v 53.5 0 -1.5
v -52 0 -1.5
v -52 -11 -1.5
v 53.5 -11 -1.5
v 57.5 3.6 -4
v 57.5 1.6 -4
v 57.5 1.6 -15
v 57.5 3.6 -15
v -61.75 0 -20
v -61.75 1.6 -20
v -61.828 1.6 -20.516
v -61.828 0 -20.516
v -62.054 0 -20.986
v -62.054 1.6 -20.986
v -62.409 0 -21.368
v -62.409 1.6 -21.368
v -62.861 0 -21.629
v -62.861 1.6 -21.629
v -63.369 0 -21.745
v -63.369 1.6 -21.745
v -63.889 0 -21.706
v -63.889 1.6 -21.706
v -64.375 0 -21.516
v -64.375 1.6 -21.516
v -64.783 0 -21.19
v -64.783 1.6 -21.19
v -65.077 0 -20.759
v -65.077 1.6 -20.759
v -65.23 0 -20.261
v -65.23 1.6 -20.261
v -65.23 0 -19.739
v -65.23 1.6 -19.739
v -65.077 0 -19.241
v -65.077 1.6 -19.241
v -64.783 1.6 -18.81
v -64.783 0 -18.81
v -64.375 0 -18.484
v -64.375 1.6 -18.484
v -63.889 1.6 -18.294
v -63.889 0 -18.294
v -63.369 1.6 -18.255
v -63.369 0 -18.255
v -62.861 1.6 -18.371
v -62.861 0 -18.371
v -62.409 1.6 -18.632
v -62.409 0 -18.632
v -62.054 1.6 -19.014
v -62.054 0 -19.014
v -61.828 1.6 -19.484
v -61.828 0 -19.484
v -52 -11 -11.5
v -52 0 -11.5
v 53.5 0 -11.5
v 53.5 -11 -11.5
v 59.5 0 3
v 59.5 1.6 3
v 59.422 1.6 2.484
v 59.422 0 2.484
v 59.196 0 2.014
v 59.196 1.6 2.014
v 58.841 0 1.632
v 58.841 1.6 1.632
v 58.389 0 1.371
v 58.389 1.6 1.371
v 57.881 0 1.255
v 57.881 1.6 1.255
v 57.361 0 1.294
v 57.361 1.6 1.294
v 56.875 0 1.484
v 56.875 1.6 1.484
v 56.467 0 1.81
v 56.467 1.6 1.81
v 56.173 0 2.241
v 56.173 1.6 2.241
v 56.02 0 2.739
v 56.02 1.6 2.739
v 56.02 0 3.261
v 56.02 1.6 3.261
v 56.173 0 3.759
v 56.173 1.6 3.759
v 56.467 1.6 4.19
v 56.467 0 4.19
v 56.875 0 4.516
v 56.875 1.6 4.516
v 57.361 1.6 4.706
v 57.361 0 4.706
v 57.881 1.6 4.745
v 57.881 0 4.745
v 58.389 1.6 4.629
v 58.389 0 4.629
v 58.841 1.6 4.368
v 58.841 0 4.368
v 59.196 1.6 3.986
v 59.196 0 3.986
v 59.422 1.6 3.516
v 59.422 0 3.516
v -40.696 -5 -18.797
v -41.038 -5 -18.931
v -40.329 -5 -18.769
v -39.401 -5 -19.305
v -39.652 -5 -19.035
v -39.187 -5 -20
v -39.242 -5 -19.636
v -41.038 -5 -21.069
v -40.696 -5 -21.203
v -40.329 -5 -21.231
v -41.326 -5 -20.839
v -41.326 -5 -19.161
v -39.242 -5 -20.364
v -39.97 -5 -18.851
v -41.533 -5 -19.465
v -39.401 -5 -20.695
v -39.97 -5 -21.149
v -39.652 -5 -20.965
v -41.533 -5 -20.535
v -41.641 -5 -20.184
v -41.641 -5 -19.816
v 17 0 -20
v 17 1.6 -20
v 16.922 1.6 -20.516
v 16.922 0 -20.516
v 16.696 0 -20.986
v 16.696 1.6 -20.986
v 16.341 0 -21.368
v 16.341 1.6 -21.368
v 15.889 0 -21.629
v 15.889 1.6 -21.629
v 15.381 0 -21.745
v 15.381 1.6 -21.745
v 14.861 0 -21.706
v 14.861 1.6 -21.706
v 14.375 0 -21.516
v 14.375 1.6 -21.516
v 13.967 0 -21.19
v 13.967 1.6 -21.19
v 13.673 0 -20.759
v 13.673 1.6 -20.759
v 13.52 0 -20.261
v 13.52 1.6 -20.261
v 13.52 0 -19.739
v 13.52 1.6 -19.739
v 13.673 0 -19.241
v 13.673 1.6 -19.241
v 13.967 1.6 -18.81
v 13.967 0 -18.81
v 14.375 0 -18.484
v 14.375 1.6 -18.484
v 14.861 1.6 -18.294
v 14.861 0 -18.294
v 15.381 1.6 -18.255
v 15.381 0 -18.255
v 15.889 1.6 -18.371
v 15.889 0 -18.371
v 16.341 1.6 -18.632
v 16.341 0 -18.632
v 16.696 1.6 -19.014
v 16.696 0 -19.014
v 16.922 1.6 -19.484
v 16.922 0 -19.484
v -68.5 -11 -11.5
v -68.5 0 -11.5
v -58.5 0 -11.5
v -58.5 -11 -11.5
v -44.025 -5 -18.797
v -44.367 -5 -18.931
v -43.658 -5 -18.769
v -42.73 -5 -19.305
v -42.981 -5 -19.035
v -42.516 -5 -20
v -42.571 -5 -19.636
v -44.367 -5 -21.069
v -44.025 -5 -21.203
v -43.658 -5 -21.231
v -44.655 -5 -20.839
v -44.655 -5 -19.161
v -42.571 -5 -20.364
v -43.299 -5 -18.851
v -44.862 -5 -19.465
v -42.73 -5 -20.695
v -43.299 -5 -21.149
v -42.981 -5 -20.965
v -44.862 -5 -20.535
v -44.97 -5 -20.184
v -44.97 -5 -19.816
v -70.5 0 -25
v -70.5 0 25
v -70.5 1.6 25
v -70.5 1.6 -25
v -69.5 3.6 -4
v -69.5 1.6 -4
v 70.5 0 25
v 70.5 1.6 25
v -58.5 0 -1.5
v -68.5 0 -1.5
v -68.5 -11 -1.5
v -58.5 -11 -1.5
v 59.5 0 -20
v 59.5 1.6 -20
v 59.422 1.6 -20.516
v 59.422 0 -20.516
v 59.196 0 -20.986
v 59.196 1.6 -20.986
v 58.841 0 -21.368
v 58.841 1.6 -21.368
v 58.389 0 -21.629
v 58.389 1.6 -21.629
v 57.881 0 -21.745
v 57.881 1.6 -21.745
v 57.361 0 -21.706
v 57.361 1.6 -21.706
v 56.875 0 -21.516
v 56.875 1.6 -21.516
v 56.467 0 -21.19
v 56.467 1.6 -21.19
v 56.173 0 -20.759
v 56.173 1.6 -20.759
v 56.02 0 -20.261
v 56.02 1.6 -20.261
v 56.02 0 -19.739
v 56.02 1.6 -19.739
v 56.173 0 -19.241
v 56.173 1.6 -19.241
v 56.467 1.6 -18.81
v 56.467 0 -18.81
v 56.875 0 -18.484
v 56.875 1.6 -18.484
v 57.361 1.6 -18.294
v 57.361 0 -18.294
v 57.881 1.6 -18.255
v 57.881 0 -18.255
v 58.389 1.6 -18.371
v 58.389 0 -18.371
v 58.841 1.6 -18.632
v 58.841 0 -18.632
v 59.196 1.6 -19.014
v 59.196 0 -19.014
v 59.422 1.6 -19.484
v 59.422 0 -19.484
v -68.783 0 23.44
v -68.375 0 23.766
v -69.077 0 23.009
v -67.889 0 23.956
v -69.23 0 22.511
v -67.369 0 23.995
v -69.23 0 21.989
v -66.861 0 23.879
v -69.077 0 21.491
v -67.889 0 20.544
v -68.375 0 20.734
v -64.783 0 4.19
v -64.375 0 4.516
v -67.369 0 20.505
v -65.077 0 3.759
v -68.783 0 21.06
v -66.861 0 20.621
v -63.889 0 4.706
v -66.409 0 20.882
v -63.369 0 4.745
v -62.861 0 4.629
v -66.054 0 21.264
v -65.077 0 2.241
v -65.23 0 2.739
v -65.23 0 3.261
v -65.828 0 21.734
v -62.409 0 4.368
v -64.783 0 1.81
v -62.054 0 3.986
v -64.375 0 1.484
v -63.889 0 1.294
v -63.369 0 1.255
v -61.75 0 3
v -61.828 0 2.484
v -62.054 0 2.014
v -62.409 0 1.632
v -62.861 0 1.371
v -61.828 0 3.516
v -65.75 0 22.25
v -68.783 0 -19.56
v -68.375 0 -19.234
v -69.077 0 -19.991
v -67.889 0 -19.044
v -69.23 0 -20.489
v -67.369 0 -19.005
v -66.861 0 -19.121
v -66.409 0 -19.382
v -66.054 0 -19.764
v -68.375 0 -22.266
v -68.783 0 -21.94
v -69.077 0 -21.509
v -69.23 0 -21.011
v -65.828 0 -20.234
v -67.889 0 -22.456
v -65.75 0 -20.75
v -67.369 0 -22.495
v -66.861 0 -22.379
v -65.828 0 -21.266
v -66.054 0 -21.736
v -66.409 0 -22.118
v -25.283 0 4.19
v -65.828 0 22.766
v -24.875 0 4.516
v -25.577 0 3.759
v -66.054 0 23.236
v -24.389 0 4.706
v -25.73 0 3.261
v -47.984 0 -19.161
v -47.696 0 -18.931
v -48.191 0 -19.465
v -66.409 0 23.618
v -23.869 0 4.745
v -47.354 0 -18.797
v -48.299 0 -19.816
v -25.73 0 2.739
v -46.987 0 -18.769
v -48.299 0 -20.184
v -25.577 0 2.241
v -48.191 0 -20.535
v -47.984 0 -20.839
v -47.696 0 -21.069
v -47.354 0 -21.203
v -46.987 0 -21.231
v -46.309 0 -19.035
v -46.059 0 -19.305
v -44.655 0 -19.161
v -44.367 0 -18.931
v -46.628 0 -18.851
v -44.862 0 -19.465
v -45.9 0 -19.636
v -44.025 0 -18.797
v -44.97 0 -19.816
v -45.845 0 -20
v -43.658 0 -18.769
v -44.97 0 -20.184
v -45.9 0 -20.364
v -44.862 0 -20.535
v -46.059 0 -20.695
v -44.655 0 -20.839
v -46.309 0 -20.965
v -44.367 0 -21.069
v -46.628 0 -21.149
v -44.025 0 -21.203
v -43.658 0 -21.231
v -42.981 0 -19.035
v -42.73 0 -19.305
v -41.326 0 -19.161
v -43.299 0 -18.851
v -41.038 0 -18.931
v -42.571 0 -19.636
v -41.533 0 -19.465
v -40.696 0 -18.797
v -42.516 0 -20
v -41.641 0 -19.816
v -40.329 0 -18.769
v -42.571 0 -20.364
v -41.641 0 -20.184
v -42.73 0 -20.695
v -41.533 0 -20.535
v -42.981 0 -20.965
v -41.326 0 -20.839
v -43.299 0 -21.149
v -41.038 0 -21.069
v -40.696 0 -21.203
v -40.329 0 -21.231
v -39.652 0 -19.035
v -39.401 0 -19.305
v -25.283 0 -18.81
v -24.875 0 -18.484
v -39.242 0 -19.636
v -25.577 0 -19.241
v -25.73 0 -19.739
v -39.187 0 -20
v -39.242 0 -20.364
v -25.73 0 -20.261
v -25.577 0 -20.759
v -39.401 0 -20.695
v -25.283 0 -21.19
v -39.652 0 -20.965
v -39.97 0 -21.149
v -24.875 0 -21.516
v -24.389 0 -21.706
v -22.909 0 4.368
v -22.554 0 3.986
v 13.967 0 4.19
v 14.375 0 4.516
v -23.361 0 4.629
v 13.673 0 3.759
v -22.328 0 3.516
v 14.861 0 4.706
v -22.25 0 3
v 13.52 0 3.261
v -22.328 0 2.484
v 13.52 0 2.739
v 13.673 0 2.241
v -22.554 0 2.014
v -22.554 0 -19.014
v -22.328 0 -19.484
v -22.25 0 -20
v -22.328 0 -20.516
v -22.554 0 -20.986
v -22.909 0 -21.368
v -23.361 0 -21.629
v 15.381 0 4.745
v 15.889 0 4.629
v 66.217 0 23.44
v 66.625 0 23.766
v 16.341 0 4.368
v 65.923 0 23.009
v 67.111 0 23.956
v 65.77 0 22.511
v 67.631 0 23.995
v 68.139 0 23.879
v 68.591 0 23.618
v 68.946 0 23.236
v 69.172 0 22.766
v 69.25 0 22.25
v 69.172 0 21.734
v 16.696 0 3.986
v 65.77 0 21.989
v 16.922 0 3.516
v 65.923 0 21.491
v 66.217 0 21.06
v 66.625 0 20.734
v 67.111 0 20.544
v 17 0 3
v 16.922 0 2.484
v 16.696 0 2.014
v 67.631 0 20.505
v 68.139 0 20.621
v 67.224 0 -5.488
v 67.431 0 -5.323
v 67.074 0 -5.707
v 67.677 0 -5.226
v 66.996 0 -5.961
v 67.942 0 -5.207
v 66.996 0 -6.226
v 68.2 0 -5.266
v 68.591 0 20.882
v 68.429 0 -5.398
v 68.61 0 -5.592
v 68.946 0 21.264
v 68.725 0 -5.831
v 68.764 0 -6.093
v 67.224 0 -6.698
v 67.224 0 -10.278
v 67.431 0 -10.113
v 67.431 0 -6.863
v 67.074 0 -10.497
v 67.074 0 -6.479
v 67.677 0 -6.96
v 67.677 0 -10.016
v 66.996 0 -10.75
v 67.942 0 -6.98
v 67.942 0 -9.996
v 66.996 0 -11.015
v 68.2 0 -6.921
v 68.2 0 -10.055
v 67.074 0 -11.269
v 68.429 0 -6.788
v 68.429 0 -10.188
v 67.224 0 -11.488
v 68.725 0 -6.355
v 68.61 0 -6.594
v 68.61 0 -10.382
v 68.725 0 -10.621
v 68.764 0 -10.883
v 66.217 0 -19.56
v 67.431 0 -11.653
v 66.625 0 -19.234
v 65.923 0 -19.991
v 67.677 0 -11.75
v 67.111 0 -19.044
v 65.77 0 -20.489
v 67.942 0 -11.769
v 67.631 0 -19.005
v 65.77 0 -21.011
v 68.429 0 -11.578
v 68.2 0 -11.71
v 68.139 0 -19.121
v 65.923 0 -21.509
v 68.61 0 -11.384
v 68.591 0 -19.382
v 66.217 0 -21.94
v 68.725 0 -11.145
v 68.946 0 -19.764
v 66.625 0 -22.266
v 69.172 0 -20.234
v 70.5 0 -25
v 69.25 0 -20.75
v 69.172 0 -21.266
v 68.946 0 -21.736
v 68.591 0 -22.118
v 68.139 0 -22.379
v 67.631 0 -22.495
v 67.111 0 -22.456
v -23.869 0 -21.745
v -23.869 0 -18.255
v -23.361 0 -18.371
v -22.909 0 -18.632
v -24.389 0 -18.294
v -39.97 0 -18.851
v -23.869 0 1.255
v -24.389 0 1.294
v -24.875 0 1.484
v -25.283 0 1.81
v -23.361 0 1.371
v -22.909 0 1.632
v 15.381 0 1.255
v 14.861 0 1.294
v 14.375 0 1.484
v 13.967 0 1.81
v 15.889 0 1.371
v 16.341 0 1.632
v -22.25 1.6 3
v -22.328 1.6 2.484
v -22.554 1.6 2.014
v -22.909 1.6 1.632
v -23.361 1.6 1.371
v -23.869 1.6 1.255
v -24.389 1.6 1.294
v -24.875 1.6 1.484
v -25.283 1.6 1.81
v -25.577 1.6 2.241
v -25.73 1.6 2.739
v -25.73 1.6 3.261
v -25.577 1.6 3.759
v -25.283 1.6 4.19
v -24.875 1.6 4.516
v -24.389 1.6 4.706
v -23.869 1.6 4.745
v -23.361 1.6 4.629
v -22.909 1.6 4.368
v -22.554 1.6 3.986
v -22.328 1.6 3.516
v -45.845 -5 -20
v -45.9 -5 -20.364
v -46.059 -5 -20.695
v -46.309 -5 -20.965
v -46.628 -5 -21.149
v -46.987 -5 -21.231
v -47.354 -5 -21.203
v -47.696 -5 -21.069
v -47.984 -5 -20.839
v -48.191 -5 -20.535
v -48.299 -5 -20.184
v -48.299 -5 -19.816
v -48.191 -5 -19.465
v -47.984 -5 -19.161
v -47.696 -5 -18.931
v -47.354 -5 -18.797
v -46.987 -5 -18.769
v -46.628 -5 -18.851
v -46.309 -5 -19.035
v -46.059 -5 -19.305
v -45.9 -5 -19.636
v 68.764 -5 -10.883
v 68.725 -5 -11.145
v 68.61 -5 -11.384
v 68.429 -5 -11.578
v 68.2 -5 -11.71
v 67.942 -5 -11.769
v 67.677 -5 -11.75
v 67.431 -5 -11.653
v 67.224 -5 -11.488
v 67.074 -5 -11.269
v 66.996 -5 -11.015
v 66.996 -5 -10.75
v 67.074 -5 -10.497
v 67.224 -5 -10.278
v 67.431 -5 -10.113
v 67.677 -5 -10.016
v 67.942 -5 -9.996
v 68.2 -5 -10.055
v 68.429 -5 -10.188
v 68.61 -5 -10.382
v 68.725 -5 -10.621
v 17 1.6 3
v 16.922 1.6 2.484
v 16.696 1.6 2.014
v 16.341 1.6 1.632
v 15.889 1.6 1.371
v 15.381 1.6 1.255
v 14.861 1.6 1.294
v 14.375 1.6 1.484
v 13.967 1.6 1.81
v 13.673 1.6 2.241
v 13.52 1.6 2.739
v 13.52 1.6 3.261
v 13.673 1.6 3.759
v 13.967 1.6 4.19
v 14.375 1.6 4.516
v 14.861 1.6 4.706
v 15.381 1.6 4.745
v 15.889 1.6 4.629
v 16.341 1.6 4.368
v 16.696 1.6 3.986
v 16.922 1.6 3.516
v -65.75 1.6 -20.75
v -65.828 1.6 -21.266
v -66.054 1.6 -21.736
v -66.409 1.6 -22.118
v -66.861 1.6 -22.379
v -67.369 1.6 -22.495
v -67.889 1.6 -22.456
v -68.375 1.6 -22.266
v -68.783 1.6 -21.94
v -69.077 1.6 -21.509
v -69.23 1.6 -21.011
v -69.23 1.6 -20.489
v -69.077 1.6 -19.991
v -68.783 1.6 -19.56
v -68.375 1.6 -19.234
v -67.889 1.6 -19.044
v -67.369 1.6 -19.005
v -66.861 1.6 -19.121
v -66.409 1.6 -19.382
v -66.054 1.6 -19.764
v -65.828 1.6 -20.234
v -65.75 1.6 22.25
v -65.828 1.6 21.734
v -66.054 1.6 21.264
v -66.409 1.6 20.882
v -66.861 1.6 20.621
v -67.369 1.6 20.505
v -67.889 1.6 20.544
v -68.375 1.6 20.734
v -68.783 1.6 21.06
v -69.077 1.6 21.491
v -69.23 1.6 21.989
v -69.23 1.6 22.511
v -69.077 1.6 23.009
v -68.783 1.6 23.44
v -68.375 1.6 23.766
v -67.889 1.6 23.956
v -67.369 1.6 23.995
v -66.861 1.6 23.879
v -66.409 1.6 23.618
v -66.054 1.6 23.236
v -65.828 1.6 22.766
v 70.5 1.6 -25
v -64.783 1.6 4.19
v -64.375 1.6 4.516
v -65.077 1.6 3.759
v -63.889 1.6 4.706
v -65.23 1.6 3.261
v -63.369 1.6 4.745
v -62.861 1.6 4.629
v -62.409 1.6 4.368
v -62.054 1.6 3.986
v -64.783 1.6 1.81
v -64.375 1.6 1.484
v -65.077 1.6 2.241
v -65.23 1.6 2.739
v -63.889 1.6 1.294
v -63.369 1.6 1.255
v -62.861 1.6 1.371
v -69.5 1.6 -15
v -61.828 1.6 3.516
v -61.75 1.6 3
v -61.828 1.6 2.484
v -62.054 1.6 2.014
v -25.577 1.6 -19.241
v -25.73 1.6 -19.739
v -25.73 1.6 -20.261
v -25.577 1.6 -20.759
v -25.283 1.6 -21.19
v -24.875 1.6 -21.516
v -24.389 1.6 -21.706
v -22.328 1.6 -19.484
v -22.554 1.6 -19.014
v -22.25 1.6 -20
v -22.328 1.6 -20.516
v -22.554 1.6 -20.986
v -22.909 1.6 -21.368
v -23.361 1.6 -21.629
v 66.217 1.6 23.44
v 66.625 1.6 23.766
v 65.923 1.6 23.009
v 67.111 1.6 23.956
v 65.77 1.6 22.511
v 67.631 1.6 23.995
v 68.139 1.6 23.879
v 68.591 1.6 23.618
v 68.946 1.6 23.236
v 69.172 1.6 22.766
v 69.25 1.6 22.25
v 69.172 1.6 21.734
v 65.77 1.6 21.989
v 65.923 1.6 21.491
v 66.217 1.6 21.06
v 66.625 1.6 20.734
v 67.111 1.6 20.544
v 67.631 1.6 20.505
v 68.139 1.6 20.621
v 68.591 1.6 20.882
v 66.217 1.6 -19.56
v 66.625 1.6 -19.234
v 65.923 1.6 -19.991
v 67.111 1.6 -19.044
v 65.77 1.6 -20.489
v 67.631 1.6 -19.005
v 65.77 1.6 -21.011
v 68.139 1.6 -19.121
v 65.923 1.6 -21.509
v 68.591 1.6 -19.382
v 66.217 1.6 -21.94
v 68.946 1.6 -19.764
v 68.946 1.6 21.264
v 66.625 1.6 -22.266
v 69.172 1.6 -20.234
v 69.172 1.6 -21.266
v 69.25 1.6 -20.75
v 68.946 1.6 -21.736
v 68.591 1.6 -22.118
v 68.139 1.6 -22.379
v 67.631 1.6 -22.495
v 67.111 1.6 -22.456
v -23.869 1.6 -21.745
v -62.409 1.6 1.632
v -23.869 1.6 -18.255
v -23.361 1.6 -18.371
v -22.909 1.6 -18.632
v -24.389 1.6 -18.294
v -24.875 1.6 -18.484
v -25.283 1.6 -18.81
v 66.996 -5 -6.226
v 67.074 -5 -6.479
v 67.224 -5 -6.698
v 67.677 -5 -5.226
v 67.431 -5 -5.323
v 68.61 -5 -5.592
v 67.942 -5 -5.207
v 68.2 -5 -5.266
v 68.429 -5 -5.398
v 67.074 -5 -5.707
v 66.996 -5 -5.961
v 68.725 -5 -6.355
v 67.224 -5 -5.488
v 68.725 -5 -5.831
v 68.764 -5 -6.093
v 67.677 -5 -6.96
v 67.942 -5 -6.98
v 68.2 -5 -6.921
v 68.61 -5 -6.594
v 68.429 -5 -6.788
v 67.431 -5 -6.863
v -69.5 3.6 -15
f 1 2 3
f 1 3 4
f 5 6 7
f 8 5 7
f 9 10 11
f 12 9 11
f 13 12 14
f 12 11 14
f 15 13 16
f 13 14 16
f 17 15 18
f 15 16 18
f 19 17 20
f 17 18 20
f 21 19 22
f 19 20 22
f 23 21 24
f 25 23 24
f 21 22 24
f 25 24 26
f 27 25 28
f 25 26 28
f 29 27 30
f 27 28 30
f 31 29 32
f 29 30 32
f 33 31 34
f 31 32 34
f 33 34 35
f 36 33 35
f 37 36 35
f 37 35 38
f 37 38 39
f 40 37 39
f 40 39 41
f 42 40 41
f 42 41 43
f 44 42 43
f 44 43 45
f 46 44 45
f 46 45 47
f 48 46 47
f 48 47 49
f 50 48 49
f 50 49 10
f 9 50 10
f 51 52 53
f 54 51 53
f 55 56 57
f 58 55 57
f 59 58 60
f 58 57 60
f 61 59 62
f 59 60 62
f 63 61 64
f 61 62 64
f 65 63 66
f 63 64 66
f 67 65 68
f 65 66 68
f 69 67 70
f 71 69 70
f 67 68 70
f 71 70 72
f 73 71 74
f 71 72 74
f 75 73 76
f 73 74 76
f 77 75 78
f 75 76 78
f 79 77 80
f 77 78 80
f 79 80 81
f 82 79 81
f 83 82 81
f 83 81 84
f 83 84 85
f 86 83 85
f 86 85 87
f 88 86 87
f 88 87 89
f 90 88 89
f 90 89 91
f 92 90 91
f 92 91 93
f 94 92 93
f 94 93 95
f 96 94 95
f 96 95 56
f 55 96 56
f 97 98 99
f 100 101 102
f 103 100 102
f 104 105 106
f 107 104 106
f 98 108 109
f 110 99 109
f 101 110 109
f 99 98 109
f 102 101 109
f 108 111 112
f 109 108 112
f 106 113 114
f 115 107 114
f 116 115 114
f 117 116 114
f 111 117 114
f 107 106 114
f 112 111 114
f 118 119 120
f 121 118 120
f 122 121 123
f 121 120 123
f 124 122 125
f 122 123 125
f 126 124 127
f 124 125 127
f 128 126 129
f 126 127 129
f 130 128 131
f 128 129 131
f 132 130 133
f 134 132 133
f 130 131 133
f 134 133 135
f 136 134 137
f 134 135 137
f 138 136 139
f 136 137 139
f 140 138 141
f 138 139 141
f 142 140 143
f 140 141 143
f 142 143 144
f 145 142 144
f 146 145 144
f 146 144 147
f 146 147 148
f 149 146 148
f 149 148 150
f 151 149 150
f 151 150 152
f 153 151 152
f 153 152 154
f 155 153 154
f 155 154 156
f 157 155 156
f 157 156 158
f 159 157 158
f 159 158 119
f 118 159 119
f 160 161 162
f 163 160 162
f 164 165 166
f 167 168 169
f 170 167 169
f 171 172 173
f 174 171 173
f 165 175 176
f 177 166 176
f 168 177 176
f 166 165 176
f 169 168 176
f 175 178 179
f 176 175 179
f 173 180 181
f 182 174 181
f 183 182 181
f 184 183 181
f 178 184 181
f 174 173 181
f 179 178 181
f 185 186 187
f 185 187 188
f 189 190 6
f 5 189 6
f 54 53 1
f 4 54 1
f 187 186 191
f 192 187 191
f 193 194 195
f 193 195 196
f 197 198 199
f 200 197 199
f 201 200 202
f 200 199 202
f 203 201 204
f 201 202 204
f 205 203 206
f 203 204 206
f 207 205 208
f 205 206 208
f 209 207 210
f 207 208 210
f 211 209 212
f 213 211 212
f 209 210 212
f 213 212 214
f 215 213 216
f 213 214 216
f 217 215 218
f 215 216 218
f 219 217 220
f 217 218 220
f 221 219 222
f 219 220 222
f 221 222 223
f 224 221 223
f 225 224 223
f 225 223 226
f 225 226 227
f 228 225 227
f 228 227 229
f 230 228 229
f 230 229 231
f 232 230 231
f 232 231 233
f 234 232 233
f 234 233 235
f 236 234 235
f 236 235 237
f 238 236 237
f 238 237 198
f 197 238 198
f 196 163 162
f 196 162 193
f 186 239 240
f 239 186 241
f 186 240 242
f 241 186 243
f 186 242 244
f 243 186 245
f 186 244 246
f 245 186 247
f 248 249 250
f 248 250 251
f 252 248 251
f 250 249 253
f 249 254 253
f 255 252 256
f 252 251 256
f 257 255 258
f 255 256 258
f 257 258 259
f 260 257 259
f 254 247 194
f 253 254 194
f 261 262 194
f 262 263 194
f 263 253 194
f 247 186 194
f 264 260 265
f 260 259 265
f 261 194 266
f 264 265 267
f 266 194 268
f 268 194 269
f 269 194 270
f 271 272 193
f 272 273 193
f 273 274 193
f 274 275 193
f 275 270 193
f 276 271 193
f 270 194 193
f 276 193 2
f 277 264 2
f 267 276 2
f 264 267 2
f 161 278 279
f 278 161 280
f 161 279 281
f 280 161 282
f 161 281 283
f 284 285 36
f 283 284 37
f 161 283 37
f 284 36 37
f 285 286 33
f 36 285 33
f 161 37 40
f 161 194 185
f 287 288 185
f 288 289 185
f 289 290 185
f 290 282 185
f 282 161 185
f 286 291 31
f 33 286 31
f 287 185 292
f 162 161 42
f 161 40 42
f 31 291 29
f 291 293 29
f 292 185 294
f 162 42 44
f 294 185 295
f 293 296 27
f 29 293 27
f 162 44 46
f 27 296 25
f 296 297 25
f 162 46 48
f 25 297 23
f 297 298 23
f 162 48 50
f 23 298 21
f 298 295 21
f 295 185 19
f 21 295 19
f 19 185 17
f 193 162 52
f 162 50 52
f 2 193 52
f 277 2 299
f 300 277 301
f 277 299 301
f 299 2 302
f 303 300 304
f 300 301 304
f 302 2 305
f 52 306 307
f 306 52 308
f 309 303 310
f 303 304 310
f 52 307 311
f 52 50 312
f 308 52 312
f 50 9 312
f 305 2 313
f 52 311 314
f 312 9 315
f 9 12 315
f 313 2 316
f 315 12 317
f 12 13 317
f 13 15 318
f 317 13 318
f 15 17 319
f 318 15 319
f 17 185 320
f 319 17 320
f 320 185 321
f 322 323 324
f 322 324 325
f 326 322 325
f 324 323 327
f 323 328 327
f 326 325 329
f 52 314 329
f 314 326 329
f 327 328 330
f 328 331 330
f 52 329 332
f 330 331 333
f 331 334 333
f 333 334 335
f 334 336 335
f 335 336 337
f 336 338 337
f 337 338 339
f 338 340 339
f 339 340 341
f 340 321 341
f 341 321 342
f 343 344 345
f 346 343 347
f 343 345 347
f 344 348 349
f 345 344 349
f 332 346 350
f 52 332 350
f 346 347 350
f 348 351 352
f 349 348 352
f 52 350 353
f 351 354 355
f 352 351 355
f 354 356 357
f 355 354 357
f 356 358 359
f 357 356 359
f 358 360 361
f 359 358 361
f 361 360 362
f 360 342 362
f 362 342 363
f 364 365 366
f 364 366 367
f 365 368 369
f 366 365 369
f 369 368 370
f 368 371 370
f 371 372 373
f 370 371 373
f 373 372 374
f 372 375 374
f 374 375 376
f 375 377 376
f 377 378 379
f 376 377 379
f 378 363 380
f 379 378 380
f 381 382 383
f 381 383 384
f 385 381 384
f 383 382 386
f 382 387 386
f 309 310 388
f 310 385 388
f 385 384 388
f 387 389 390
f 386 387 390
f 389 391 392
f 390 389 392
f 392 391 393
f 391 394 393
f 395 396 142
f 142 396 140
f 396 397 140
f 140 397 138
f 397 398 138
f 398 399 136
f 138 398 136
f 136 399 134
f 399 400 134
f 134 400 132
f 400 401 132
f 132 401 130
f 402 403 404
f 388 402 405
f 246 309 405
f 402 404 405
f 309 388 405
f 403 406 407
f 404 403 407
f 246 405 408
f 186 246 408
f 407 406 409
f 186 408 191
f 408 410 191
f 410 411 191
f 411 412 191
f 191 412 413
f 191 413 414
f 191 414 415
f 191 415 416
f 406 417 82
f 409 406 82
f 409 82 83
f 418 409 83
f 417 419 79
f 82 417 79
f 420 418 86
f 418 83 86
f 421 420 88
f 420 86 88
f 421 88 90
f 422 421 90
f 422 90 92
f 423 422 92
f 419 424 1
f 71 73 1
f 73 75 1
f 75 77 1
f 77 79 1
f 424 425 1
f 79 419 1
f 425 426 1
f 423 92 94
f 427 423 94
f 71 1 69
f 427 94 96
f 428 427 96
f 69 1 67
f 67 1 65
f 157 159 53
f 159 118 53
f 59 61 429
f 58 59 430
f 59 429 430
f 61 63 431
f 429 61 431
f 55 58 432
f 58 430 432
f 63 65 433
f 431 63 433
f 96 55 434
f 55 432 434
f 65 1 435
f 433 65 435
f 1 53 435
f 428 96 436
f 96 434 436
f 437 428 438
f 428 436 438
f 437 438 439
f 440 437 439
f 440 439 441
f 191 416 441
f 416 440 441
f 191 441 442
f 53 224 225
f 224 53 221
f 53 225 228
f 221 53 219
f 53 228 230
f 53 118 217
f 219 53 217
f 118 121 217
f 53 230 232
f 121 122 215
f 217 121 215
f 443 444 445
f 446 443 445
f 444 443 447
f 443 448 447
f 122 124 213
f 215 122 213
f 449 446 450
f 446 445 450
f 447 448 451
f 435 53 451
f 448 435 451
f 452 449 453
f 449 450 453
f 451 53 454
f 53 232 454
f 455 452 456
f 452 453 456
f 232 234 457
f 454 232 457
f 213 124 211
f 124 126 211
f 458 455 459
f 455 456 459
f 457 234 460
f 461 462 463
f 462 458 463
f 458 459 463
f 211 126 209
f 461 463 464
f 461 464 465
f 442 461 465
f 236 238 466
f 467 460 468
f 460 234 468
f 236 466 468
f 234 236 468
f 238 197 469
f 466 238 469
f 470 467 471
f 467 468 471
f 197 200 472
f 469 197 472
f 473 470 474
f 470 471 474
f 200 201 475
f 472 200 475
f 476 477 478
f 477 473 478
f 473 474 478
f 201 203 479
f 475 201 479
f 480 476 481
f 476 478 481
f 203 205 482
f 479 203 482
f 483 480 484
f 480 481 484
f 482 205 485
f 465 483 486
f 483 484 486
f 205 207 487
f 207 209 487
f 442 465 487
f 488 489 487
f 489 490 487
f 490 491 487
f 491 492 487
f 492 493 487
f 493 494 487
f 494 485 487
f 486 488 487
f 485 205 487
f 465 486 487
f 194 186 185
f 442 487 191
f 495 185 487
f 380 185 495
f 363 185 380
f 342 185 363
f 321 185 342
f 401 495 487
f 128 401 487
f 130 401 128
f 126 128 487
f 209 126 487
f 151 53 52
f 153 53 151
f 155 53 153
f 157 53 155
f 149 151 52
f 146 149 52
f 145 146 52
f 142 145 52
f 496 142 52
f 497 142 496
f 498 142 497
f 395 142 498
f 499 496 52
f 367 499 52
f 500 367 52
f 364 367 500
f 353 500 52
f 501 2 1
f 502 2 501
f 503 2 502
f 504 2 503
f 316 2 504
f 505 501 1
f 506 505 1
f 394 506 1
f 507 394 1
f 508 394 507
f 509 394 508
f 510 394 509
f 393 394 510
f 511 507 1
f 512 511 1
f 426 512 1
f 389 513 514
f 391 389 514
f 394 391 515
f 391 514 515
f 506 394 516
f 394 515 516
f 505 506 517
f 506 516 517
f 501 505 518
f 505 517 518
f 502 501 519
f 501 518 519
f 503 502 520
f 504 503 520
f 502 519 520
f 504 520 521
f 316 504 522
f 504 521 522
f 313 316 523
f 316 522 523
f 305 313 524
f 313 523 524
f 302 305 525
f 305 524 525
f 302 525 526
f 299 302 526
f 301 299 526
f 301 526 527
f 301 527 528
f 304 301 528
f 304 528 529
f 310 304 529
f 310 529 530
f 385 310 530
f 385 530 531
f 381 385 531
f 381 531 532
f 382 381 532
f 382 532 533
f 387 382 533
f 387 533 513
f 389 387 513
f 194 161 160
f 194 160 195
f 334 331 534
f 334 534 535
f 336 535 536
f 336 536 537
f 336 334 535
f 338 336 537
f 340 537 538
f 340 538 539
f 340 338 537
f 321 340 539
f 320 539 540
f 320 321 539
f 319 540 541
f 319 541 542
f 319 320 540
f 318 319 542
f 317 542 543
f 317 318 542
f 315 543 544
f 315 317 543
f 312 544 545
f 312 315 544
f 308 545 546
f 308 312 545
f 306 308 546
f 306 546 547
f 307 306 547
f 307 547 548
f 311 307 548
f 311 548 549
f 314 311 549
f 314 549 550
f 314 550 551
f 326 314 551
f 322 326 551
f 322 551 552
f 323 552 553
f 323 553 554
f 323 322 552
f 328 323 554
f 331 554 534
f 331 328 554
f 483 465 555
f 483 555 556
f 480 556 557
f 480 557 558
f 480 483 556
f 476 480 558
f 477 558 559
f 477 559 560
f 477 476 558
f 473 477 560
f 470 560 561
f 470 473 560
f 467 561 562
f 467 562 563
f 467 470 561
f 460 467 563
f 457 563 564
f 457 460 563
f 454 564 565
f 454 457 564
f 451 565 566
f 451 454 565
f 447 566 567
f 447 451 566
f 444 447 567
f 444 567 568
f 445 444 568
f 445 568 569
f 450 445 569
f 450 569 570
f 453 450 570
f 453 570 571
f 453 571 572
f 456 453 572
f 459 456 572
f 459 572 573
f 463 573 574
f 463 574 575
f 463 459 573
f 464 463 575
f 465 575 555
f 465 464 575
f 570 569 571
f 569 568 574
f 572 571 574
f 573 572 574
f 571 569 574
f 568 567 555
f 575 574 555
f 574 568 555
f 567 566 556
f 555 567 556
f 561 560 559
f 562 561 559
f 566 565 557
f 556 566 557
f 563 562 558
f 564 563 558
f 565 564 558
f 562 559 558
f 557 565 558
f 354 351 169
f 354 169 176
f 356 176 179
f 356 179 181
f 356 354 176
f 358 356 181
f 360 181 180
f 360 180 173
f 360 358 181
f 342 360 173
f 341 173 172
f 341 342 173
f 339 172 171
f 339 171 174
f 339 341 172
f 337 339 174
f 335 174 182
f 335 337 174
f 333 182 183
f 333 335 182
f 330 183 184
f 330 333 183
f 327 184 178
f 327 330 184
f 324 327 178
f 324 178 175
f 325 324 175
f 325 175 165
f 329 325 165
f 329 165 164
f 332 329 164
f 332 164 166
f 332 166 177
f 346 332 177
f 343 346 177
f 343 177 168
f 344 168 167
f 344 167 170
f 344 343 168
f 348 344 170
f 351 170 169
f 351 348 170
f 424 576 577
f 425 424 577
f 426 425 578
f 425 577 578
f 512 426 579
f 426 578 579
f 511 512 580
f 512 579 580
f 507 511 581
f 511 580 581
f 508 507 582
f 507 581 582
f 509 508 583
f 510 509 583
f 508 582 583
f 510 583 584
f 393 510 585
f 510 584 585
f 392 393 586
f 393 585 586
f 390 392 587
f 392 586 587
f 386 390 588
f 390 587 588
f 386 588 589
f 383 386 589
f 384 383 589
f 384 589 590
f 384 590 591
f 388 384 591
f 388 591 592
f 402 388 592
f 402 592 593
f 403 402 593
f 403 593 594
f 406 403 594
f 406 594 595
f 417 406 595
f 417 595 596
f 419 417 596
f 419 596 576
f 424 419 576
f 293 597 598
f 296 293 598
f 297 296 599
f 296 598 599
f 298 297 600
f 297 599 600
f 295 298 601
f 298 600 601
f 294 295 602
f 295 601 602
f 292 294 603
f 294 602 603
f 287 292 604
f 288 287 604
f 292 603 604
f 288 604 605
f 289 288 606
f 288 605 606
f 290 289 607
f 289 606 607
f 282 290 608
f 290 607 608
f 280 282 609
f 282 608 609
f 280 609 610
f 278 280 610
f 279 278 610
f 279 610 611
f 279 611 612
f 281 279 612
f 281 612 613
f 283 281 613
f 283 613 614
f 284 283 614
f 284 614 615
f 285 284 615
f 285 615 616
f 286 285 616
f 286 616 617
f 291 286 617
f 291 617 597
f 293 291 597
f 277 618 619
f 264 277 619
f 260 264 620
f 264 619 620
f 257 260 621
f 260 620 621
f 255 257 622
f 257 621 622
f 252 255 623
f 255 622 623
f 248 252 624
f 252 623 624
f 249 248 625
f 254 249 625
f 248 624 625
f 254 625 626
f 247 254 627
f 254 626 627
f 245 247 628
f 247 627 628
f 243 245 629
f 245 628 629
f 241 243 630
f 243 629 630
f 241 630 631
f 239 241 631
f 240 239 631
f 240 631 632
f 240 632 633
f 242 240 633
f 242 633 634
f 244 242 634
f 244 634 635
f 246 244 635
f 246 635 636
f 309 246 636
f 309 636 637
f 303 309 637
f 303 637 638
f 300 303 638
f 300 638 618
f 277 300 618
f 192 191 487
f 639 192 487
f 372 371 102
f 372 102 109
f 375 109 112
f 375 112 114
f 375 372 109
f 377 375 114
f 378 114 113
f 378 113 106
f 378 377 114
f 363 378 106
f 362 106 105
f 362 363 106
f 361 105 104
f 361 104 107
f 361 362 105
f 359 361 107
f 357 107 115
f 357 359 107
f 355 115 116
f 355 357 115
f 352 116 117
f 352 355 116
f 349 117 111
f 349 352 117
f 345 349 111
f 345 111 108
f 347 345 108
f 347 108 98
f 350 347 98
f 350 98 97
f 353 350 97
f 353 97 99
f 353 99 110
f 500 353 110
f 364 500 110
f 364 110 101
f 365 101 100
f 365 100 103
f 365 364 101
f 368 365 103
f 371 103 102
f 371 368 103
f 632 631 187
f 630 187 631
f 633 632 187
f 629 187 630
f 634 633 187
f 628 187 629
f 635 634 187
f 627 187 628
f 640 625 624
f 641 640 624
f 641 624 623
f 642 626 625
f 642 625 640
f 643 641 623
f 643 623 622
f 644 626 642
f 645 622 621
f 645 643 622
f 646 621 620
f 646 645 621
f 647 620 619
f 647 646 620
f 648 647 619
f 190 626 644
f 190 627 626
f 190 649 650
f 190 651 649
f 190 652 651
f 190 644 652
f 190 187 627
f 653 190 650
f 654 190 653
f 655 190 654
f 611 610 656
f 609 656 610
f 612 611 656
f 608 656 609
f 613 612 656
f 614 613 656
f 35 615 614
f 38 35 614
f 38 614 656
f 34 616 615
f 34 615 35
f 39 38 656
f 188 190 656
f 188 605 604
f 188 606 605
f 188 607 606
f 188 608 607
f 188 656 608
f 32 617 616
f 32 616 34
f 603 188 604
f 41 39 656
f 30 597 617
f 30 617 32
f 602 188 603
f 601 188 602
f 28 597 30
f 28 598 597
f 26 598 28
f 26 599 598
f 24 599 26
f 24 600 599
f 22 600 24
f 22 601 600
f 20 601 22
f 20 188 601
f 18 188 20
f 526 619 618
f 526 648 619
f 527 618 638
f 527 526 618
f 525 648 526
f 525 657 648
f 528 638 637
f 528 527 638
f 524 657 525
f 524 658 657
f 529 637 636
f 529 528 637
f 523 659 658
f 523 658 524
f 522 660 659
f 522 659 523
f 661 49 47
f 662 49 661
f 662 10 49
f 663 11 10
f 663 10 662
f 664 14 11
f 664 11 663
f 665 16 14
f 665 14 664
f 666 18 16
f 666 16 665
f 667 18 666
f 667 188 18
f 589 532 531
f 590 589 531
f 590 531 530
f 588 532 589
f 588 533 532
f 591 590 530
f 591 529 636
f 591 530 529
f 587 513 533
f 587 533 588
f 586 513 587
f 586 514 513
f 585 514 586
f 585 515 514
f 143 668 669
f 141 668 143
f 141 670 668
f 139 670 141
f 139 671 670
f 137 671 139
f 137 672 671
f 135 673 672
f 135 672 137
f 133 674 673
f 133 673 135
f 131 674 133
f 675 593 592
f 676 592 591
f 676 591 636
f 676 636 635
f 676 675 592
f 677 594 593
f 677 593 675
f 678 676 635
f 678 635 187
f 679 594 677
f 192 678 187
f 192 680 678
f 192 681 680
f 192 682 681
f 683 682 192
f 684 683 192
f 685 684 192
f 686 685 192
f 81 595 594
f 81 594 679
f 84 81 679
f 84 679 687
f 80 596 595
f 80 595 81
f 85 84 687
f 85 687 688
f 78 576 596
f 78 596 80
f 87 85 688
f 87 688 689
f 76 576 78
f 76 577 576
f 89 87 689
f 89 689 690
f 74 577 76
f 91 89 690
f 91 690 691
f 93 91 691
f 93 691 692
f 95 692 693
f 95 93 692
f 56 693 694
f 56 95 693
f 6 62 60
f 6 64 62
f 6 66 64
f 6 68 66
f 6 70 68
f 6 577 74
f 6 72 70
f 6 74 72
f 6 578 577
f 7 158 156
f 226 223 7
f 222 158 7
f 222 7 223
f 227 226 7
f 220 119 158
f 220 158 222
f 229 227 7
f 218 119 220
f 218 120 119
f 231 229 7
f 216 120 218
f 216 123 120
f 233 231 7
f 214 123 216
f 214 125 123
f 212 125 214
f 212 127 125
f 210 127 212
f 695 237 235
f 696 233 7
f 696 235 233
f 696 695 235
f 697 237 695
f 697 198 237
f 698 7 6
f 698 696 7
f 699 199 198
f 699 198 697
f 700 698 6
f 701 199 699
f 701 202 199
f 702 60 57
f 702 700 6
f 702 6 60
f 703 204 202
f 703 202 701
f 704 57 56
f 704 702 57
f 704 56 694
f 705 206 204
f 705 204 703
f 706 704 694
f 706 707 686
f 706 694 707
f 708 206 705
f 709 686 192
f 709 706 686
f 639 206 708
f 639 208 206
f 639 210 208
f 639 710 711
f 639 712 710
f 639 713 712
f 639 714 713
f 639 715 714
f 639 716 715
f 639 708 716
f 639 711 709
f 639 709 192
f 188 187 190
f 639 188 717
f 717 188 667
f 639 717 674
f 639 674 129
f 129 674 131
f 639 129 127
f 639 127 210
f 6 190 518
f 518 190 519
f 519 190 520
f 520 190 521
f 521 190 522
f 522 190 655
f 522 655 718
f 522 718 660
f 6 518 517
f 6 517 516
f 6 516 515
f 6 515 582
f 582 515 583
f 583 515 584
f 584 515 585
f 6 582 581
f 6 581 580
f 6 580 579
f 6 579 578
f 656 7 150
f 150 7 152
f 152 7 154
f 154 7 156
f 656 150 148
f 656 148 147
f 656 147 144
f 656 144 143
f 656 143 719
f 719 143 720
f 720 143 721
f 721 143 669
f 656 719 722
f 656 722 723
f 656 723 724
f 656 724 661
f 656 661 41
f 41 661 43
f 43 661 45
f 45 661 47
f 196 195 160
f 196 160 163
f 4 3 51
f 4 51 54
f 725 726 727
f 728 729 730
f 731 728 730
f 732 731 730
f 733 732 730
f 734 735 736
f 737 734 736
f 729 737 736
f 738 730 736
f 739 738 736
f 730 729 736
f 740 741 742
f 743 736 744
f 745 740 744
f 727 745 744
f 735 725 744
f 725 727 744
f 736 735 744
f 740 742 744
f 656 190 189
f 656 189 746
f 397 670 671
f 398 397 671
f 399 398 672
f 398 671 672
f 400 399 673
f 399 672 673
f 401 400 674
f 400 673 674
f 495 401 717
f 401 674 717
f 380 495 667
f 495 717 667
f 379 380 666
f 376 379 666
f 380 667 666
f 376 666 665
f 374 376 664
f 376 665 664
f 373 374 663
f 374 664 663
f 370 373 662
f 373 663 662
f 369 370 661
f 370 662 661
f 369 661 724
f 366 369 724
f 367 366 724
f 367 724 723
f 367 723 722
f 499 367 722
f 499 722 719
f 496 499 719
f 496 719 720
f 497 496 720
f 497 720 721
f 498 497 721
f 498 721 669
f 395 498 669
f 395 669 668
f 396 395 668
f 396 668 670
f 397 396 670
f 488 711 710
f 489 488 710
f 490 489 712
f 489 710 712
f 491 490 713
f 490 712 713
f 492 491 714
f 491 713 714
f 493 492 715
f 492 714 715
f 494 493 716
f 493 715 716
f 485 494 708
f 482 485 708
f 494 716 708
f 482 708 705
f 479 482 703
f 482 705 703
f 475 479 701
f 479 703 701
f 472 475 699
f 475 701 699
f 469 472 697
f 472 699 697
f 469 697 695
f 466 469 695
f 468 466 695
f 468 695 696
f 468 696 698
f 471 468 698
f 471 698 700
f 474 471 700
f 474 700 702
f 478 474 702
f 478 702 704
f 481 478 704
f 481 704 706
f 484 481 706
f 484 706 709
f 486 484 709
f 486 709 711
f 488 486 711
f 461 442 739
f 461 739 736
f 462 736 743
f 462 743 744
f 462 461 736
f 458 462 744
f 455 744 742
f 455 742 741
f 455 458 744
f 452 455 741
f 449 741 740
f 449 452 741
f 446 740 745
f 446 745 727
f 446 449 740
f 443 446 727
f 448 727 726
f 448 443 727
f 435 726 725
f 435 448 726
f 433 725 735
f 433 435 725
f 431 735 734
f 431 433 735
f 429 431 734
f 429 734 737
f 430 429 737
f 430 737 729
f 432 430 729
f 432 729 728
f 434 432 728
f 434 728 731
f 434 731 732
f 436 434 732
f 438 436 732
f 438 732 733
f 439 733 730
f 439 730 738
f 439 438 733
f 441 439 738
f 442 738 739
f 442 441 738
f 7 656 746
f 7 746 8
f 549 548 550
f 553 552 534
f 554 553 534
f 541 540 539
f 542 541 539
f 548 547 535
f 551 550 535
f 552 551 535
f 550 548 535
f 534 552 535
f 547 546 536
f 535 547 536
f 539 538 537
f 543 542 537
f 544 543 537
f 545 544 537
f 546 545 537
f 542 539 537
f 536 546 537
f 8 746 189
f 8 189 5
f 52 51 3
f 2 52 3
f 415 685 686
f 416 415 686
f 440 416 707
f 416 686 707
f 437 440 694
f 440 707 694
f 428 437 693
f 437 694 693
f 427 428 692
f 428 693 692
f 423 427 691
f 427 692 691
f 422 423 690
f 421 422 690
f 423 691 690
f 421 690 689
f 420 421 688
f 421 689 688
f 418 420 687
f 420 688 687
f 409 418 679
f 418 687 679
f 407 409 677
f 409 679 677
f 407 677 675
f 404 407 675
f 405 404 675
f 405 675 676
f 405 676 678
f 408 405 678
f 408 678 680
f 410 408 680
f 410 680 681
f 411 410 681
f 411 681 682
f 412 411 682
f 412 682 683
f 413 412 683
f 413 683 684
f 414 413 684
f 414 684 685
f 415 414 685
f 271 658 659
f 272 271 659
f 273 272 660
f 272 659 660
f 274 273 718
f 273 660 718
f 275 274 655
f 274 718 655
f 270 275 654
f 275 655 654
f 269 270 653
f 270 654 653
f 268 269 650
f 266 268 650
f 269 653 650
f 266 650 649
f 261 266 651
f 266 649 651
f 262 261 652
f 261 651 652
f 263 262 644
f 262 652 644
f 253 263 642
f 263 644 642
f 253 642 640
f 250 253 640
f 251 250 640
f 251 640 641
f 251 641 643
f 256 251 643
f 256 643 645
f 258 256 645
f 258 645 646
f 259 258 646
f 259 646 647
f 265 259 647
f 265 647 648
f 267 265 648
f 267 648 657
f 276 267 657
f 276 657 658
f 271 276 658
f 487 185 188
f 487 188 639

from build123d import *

# Parameters (mm, degrees)
SKETCH_1_W          = 141
SKETCH_1_H          = 50
EXTRUDE_1_DEPTH     = 1.6
SKETCH_2_R          = 1.75
CUT_EXTRUDE_1_DEPTH = 10
SKETCH_3_R          = 1.75
CUT_EXTRUDE_2_DEPTH = 10
SKETCH_4_R          = 1.234132003
EXTRUDE_2_DEPTH     = 5
SKETCH_7_W          = 122
SKETCH_7_H          = 10
EXTRUDE_3_DEPTH     = 11
SKETCH_8_W          = 127
SKETCH_8_H          = 11
EXTRUDE_4_DEPTH     = 2
SKETCH_6_R          = 0.888976415
EXTRUDE_5_DEPTH     = 5
SKETCH_9_W          = 6.5
SKETCH_9_H          = 10
CUT_EXTRUDE_3_DEPTH = 11


with BuildPart() as part:
    # 草图1 → 凸台-拉伸1 (new body)
    with BuildSketch(Plane(origin=(0, 0, 0), x_dir=(1, 0, 0), z_dir=(0, 1, 0))):
        Rectangle(SKETCH_1_W, SKETCH_1_H)
    extrude(amount=EXTRUDE_1_DEPTH)

    # 草图2 → 切除-拉伸1 (cut)
    with BuildSketch(Plane(origin=(0, 1.6, 0), x_dir=(1, 0, 0), z_dir=(0, 1, 0))):
        with Locations((-67.5, -22.25)):
            Circle(SKETCH_2_R)
        with Locations((-67.5, 20.75)):
            Circle(SKETCH_2_R)
        with Locations((67.5, 20.75)):
            Circle(SKETCH_2_R)
        with Locations((67.5, -22.25)):
            Circle(SKETCH_2_R)
    extrude(amount=-CUT_EXTRUDE_1_DEPTH, mode=Mode.SUBTRACT)

    # 草图3 → 切除-拉伸2 (cut)
    with BuildSketch(Plane(origin=(0, 1.6, 0), x_dir=(1, 0, 0), z_dir=(0, 1, 0))):
        with Locations((-63.5, 20)):
            Circle(SKETCH_3_R)
        with Locations((-24, 20)):
            Circle(SKETCH_3_R)
        with Locations((-63.5, -3)):
            Circle(SKETCH_3_R)
        with Locations((-24, -3)):
            Circle(SKETCH_3_R)
        with Locations((15.25, -3)):
            Circle(SKETCH_3_R)
        with Locations((57.75, -3)):
            Circle(SKETCH_3_R)
        with Locations((15.25, 20)):
            Circle(SKETCH_3_R)
        with Locations((57.75, 20)):
            Circle(SKETCH_3_R)
    extrude(amount=-CUT_EXTRUDE_2_DEPTH, mode=Mode.SUBTRACT)

    # 草图4 → 凸台-拉伸2 (add)
    with BuildSketch(Plane(origin=(0, 0, 0), x_dir=(1, 0, 0), z_dir=(0, 1, 0))):
        with Locations((-47.078898204, 20)):
            Circle(SKETCH_4_R)
        with Locations((-43.75, 20)):
            Circle(SKETCH_4_R)
        with Locations((-40.421101796, 20)):
            Circle(SKETCH_4_R)
    extrude(amount=-EXTRUDE_2_DEPTH)

    # 草图7 → 凸台-拉伸3 (add)
    with BuildSketch(Plane.XZ):
        with Locations((-7.5, -6.5)):
            Rectangle(SKETCH_7_W, SKETCH_7_H)
    extrude(amount=EXTRUDE_3_DEPTH)

    # 草图8 → 凸台-拉伸4 (add)
    with BuildSketch(Plane(origin=(0, 1.6, 0), x_dir=(1, 0, 0), z_dir=(0, 1, 0))):
        with Locations((-6, 9.5)):
            Rectangle(SKETCH_8_W, SKETCH_8_H)
    extrude(amount=EXTRUDE_4_DEPTH)

    # 草图6 → 凸台-拉伸5 (add)
    with BuildSketch(Plane(origin=(0, 0, 0), x_dir=(1, 0, 0), z_dir=(0, 1, 0))):
        with Locations((67.875178123, 10.882897677)):
            Circle(SKETCH_6_R)
        with Locations((67.875178123, 6.093097389)):
            Circle(SKETCH_6_R)
    extrude(amount=-EXTRUDE_5_DEPTH)

    # 草图9 → 切除-拉伸3 (cut)
    with BuildSketch(Plane.XZ.offset(11)):
        with Locations((-55.25, -6.5)):
            Rectangle(SKETCH_9_W, SKETCH_9_H)
    extrude(amount=-CUT_EXTRUDE_3_DEPTH, mode=Mode.SUBTRACT)


solid = part.part
